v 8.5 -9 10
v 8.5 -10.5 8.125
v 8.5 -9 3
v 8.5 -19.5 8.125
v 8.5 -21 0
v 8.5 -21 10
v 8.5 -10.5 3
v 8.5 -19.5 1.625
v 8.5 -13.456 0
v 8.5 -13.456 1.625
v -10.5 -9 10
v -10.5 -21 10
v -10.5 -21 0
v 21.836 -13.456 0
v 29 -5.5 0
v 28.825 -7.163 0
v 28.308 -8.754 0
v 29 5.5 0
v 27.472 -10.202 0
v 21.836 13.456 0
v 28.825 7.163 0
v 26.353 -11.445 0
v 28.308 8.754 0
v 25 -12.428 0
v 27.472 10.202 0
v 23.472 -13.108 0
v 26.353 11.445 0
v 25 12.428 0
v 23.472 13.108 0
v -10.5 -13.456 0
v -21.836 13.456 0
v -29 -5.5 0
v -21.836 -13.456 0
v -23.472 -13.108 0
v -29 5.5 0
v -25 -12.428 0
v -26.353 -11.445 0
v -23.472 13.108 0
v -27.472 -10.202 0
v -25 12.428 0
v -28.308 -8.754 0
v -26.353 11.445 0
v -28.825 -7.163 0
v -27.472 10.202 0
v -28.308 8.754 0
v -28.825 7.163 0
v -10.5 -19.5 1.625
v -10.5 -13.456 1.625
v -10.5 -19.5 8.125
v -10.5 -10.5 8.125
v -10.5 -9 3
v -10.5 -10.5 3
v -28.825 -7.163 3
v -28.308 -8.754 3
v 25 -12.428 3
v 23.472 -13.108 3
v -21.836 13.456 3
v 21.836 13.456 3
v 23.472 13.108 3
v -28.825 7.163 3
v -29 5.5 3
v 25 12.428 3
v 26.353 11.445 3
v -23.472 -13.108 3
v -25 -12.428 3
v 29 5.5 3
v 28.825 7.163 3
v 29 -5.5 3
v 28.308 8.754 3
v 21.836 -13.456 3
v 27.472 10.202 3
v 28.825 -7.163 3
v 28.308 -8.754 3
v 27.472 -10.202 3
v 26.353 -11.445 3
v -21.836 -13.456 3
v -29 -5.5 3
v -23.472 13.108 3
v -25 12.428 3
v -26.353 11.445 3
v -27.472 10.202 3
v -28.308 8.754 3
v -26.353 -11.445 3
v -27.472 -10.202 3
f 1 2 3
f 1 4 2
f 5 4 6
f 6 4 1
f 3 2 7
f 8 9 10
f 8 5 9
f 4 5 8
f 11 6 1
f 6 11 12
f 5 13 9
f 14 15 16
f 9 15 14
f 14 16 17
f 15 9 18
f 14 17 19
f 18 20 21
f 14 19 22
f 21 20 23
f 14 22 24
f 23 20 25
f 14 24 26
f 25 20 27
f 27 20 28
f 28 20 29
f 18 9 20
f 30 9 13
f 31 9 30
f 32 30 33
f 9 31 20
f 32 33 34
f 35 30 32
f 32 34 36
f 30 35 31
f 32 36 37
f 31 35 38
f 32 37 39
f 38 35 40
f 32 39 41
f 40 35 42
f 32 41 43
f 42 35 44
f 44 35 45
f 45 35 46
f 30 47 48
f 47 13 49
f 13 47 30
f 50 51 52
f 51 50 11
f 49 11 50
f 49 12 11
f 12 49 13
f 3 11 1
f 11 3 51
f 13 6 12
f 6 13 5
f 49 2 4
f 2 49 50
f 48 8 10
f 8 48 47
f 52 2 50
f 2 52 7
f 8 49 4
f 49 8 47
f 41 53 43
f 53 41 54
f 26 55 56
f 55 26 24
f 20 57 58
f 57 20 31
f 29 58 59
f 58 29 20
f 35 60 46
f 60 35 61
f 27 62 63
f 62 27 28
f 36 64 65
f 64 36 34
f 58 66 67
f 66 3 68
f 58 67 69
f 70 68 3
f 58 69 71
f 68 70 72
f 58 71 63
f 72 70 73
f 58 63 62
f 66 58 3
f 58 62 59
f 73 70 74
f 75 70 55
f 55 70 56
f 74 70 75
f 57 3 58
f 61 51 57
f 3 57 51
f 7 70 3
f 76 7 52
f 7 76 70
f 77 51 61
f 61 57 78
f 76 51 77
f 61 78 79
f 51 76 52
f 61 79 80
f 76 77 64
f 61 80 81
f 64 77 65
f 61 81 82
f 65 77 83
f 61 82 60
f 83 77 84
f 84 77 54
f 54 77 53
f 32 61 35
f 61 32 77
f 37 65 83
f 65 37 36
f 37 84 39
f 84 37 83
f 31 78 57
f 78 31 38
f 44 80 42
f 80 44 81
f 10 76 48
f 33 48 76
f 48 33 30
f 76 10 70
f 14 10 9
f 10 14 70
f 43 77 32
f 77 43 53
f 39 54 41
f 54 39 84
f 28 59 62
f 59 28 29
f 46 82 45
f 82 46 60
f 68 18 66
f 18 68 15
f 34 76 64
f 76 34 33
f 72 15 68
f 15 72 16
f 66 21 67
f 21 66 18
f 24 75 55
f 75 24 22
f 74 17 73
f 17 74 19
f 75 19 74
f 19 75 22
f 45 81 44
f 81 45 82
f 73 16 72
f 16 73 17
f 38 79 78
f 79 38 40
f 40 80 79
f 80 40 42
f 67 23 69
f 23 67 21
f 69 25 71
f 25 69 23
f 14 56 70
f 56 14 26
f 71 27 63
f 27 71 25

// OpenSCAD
include <../../name-tag.scad>
        
font="../../write/orbitron.dxf";

nametag(font=font);
